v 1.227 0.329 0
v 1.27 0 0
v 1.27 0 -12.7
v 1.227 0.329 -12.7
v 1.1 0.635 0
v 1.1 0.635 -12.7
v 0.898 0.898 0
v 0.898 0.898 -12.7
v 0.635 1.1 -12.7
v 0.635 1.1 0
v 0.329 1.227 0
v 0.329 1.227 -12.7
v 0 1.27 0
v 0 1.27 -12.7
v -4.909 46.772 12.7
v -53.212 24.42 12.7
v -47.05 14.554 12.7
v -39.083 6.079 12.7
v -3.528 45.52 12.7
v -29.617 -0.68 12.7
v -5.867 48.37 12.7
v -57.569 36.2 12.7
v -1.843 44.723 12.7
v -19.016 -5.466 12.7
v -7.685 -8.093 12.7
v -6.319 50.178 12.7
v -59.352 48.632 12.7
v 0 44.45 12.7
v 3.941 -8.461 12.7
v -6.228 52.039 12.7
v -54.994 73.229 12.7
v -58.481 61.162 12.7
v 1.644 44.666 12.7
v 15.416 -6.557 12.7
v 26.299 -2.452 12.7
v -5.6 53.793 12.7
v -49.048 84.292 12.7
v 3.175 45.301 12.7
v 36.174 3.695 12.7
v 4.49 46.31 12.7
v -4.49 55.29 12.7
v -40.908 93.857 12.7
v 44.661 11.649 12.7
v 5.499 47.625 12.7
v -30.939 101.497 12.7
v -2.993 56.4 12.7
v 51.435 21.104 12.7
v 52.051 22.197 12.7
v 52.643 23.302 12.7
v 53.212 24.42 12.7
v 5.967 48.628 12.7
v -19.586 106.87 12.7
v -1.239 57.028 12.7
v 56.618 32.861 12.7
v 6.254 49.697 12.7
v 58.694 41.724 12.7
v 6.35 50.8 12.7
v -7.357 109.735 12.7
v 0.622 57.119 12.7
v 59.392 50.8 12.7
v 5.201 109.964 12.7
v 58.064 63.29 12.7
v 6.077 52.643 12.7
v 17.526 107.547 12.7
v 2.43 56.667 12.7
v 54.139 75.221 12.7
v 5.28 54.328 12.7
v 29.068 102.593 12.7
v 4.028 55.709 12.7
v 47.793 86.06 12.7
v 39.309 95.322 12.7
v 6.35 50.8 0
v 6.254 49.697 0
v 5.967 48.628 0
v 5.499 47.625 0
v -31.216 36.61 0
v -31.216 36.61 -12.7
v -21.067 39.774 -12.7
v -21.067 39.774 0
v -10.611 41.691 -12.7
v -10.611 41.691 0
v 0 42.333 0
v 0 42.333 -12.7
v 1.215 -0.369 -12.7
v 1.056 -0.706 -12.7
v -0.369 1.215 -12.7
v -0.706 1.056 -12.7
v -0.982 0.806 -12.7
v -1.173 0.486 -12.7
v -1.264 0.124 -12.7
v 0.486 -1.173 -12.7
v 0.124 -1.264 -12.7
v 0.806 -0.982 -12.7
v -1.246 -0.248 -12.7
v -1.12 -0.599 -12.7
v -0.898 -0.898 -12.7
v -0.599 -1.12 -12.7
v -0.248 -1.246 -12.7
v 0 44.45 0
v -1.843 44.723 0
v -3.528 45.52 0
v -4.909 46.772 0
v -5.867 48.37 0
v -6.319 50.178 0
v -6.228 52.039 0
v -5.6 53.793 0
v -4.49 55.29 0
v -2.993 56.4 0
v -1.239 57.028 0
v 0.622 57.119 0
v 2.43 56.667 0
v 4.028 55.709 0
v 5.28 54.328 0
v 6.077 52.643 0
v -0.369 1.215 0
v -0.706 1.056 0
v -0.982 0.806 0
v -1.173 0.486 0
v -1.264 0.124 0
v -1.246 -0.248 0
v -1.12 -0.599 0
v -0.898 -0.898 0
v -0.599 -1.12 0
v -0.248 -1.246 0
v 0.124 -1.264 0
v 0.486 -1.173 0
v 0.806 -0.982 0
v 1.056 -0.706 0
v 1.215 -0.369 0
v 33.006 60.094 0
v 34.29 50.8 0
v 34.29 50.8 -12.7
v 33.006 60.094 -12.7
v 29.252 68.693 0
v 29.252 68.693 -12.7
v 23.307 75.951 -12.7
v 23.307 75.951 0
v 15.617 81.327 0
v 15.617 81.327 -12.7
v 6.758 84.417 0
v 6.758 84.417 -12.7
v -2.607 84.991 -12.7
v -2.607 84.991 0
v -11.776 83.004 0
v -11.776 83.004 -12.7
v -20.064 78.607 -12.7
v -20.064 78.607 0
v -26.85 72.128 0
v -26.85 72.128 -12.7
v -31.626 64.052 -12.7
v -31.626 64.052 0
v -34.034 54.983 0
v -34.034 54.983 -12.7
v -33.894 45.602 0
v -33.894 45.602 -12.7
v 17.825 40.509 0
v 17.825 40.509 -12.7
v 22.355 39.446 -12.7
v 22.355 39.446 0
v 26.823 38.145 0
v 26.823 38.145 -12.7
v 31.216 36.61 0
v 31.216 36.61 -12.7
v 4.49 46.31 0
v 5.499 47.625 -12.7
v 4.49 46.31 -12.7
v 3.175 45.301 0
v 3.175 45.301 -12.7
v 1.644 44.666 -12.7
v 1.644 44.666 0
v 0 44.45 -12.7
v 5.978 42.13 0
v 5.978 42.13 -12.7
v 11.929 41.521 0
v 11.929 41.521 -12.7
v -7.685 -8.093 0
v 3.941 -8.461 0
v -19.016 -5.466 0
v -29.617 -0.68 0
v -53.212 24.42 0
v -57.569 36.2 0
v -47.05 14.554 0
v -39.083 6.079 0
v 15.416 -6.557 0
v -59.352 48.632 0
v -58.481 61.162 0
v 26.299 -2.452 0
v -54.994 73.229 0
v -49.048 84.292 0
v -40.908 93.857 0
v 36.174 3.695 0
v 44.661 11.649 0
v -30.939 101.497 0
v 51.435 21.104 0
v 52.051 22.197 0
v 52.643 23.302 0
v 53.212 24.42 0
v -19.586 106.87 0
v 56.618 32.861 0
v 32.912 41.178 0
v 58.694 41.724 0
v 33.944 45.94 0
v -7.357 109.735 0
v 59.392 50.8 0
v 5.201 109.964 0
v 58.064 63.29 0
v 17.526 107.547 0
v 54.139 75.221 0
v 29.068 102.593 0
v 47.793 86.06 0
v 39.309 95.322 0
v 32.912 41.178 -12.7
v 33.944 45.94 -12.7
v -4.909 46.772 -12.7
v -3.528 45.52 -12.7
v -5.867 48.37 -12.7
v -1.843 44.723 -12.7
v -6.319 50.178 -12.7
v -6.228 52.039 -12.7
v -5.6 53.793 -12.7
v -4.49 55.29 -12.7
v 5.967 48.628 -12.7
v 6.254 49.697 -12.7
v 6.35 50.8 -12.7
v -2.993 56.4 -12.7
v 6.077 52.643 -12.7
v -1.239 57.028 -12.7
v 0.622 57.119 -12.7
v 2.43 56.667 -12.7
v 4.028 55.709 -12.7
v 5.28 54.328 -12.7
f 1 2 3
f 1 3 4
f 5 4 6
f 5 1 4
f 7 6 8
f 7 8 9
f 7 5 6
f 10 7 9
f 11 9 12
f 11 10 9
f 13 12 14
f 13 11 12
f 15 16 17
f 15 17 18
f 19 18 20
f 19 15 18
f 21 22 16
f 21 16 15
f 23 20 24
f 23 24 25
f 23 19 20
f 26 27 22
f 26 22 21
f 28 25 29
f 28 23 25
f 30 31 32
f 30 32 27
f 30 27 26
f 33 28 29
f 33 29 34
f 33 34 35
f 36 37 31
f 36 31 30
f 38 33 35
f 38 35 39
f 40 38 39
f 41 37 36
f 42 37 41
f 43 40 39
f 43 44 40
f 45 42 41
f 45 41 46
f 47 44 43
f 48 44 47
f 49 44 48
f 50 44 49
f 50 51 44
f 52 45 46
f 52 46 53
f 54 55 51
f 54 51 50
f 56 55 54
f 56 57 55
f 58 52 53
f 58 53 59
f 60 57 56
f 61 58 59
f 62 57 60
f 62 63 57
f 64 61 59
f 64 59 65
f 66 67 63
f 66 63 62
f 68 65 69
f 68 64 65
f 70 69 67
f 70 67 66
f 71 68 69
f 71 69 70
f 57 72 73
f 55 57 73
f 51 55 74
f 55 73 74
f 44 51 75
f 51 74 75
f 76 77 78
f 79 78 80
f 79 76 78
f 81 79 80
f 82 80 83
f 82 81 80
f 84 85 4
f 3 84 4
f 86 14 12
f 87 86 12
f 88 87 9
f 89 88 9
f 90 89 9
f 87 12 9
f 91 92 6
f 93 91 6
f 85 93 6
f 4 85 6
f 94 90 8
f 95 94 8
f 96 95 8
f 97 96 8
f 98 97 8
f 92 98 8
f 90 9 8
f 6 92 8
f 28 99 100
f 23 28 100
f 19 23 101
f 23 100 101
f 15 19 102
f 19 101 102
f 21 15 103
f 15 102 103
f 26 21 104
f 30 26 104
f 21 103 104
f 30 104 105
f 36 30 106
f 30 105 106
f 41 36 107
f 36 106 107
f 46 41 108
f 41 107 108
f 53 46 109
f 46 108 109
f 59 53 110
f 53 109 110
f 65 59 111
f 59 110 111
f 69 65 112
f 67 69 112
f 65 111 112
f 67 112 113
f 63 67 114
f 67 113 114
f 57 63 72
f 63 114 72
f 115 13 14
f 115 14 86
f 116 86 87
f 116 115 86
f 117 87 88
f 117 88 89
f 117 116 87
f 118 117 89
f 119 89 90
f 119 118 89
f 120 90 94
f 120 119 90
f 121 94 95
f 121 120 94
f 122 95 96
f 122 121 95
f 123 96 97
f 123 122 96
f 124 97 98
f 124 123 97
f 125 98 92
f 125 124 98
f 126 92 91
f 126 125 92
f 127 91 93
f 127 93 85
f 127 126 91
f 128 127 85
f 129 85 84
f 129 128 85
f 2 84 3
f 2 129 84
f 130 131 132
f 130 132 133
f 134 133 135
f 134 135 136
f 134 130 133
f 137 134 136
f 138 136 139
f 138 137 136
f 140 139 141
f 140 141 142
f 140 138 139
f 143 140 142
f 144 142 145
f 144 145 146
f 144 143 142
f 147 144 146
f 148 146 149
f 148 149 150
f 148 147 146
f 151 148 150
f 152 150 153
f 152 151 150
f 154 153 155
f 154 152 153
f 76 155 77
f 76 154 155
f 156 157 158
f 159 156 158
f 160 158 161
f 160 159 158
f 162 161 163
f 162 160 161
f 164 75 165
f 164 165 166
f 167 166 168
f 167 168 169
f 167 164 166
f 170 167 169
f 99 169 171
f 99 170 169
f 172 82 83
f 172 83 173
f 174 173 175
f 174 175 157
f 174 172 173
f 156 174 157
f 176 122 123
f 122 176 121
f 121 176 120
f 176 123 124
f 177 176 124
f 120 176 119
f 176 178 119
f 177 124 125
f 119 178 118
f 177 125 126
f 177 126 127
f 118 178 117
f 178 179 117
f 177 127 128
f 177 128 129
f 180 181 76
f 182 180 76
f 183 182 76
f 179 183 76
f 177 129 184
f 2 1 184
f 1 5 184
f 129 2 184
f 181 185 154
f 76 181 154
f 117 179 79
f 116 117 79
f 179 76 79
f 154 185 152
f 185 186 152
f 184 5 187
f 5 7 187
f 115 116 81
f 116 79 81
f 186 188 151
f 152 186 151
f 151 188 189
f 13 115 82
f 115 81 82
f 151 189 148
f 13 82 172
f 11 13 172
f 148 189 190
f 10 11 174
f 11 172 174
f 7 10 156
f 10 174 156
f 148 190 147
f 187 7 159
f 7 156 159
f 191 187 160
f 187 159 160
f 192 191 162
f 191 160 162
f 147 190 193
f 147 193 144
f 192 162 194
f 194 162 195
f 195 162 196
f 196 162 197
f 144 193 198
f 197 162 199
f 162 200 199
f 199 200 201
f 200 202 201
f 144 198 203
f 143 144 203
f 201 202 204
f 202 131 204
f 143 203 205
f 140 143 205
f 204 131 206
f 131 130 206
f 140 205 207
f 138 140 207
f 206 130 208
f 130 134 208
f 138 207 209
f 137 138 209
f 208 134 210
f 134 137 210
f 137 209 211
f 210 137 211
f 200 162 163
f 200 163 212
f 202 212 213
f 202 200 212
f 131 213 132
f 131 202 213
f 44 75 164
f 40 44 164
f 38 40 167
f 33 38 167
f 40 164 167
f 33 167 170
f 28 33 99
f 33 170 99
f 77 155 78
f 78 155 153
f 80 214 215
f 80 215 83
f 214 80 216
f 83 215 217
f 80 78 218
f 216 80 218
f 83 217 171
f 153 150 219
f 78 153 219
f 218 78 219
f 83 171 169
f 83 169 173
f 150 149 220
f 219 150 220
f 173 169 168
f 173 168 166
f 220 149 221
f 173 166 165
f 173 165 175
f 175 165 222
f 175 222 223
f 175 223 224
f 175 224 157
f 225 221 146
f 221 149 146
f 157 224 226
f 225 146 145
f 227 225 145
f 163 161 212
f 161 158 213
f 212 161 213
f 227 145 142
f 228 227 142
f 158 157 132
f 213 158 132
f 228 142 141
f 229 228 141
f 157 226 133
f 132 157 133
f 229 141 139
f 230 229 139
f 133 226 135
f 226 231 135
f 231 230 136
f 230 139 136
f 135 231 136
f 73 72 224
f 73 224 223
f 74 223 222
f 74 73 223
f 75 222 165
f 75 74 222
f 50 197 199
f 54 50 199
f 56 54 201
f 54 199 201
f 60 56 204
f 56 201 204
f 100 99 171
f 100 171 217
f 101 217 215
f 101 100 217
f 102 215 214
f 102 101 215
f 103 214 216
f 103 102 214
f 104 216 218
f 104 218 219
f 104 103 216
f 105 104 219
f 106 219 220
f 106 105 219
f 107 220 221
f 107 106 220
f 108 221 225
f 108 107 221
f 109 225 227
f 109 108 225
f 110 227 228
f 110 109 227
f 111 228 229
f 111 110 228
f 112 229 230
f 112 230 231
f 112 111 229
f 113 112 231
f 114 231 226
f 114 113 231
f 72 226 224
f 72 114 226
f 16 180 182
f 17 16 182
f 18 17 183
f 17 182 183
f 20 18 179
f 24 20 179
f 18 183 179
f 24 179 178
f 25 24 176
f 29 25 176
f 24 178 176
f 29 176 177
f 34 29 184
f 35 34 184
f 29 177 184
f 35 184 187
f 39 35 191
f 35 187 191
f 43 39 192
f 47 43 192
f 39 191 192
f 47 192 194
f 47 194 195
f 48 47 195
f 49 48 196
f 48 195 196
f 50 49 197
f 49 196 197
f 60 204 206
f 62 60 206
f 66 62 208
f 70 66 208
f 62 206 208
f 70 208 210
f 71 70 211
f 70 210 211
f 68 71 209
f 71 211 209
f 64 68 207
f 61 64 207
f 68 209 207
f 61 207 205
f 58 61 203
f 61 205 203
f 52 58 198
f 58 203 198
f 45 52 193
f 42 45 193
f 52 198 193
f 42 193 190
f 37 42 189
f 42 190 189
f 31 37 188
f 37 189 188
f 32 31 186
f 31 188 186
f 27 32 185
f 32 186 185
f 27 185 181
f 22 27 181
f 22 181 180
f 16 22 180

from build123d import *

# Parameters (mm, degrees)
F1_DEPTH = 12.7
F2_DEPTH = 12.7


with BuildPart() as f1:
    # F0 (on Top) → F1 (new body)
    with BuildSketch(Plane.XY):
        with BuildLine():
            Line((1.27, 0), (0, 0))
            Line((0, 0), (0, 1.27))
            ThreePointArc((0, 1.27), (-0.8980256121, -0.8980256121), (1.27, 0))
        make_face()
        with BuildLine():
            Line((0, 1.27), (0, 0))
            Line((0, 0), (1.27, 0))
            ThreePointArc((1.27, 0), (0.8980256121, 0.8980256121), (0, 1.27))
        make_face()
        with BuildLine():
            ThreePointArc((1.27, 0), (-0.8980256121, -0.8980256121), (0, 1.27))
            Line((0, 1.27), (0, 16.51))
            ThreePointArc((0, 16.51), (-18.5637162853, 21.9695900536), (-31.2160717781, 36.6098286569))
            ThreePointArc((-31.2160717781, 36.6098286569), (-42.6516552572, 31.3045995485), (-53.2117304222, 24.4196276597))
            ThreePointArc((-53.2117304222, 24.4196276597), (-16.5828563916, -6.2300023956), (30.7696652459, 0))
            Line((30.7696652459, 0), (1.27, 0))
        make_face()
        with BuildLine():
            Line((0, 16.51), (0, 1.27))
            ThreePointArc((0, 1.27), (0.8980256121, 0.8980256121), (1.27, 0))
            Line((1.27, 0), (30.7696652459, 0))
            ThreePointArc((30.7696652459, 0), (42.4352015878, 9.2468296571), (51.4349999952, 21.103988907))
            Line((51.4349999952, 21.103988907), (29.6960110958, 33.655))
            ThreePointArc((29.6960110958, 33.655), (17.145, 21.1039889042), (0, 16.51))
        make_face()
        with BuildLine():
            ThreePointArc((-31.2160717781, 36.6098286569), (-18.5637162853, 21.9695900536), (0, 16.51))
            Line((0, 16.51), (0, 42.3333333333))
            ThreePointArc((0, 42.3333333333), (-15.8682201509, 40.8906294723), (-31.2160717781, 36.6098286569))
        make_face()
        with BuildLine():
            Line((0, 42.3333333333), (0, 16.51))
            ThreePointArc((0, 16.51), (17.145, 21.1039889042), (29.6960110958, 33.655))
            Line((29.6960110958, 33.655), (17.8245764663, 40.508975979))
            ThreePointArc((17.8245764663, 40.508975979), (8.9588476653, 41.8760557513), (0, 42.3333333333))
        make_face()
        with BuildLine():
            ThreePointArc((-31.2160717781, 36.6098286569), (-15.8682201509, 40.8906294723), (0, 42.3333333333))
            Line((0, 42.3333333333), (0, 44.45))
            ThreePointArc((0, 44.45), (-4.4901280605, 55.2901280605), (6.35, 50.8))
            ThreePointArc((6.35, 50.8), (6.1336289969, 49.1564990636), (5.499261314, 47.625))
            Line((5.499261314, 47.625), (17.8245764663, 40.508975979))
            ThreePointArc((17.8245764663, 40.508975979), (24.5977058385, 38.8251673187), (31.2160717781, 36.6098286569))
            ThreePointArc((31.2160717781, 36.6098286569), (33.5127080469, 43.5403512919), (34.29, 50.8))
            ThreePointArc((34.29, 50.8), (-7.2596487081, 84.3127080469), (-31.2160717781, 36.6098286569))
        make_face()
        with BuildLine():
            Line((0, 44.45), (0, 42.3333333333))
            ThreePointArc((0, 42.3333333333), (8.9588476653, 41.8760557513), (17.8245764663, 40.508975979))
            Line((17.8245764663, 40.508975979), (5.499261314, 47.625))
            ThreePointArc((5.499261314, 47.625), (3.175, 45.300738686), (0, 44.45))
        make_face()
        with BuildLine():
            ThreePointArc((-53.2117304222, 24.4196276597), (-42.6516552572, 31.3045995485), (-31.2160717781, 36.6098286569))
            ThreePointArc((-31.2160717781, 36.6098286569), (-7.2596487081, 84.3127080469), (34.29, 50.8))
            ThreePointArc((34.29, 50.8), (33.5127080469, 43.5403512919), (31.2160717781, 36.6098286569))
            ThreePointArc((31.2160717781, 36.6098286569), (42.6516552572, 31.3045995485), (53.2117304222, 24.4196276597))
            ThreePointArc((53.2117304222, 24.4196276597), (57.8263113692, 37.2526750694), (59.392022186, 50.8))
            ThreePointArc((59.392022186, 50.8), (-13.5473249306, 108.6263113692), (-53.2117304222, 24.4196276597))
        make_face()
        with BuildLine():
            ThreePointArc((31.2160717781, 36.6098286569), (30.4918548649, 35.1139907276), (29.6960110958, 33.655))
            Line((29.6960110958, 33.655), (51.4349999952, 21.103988907))
            ThreePointArc((51.4349999952, 21.103988907), (52.3496218883, 22.7477382821), (53.2117304222, 24.4196276597))
            ThreePointArc((53.2117304222, 24.4196276597), (42.6516552572, 31.3045995485), (31.2160717781, 36.6098286569))
        make_face()
        with BuildLine():
            Line((17.8245764663, 40.508975979), (29.6960110958, 33.655))
            ThreePointArc((29.6960110958, 33.655), (30.4918548649, 35.1139907276), (31.2160717781, 36.6098286569))
            ThreePointArc((31.2160717781, 36.6098286569), (24.5977058385, 38.8251673187), (17.8245764663, 40.508975979))
        make_face()
    extrude(amount=F1_DEPTH)

    # F0 (on Top) → F2 (join)
    with BuildSketch(Plane.XY):
        with BuildLine():
            Line((0, 1.27), (0, 0))
            Line((0, 0), (1.27, 0))
            ThreePointArc((1.27, 0), (0.8980256121, 0.8980256121), (0, 1.27))
        make_face()
        with BuildLine():
            Line((1.27, 0), (0, 0))
            Line((0, 0), (0, 1.27))
            ThreePointArc((0, 1.27), (-0.8980256121, -0.8980256121), (1.27, 0))
        make_face()
        with BuildLine():
            ThreePointArc((-31.2160717781, 36.6098286569), (-15.8682201509, 40.8906294723), (0, 42.3333333333))
            Line((0, 42.3333333333), (0, 44.45))
            ThreePointArc((0, 44.45), (-4.4901280605, 55.2901280605), (6.35, 50.8))
            ThreePointArc((6.35, 50.8), (6.1336289969, 49.1564990636), (5.499261314, 47.625))
            Line((5.499261314, 47.625), (17.8245764663, 40.508975979))
            ThreePointArc((17.8245764663, 40.508975979), (24.5977058385, 38.8251673187), (31.2160717781, 36.6098286569))
            ThreePointArc((31.2160717781, 36.6098286569), (33.5127080469, 43.5403512919), (34.29, 50.8))
            ThreePointArc((34.29, 50.8), (-7.2596487081, 84.3127080469), (-31.2160717781, 36.6098286569))
        make_face()
        with BuildLine():
            Line((0, 44.45), (0, 42.3333333333))
            ThreePointArc((0, 42.3333333333), (8.9588476653, 41.8760557513), (17.8245764663, 40.508975979))
            Line((17.8245764663, 40.508975979), (5.499261314, 47.625))
            ThreePointArc((5.499261314, 47.625), (3.175, 45.300738686), (0, 44.45))
        make_face()
    extrude(amount=-F2_DEPTH)


solid = f1.part
